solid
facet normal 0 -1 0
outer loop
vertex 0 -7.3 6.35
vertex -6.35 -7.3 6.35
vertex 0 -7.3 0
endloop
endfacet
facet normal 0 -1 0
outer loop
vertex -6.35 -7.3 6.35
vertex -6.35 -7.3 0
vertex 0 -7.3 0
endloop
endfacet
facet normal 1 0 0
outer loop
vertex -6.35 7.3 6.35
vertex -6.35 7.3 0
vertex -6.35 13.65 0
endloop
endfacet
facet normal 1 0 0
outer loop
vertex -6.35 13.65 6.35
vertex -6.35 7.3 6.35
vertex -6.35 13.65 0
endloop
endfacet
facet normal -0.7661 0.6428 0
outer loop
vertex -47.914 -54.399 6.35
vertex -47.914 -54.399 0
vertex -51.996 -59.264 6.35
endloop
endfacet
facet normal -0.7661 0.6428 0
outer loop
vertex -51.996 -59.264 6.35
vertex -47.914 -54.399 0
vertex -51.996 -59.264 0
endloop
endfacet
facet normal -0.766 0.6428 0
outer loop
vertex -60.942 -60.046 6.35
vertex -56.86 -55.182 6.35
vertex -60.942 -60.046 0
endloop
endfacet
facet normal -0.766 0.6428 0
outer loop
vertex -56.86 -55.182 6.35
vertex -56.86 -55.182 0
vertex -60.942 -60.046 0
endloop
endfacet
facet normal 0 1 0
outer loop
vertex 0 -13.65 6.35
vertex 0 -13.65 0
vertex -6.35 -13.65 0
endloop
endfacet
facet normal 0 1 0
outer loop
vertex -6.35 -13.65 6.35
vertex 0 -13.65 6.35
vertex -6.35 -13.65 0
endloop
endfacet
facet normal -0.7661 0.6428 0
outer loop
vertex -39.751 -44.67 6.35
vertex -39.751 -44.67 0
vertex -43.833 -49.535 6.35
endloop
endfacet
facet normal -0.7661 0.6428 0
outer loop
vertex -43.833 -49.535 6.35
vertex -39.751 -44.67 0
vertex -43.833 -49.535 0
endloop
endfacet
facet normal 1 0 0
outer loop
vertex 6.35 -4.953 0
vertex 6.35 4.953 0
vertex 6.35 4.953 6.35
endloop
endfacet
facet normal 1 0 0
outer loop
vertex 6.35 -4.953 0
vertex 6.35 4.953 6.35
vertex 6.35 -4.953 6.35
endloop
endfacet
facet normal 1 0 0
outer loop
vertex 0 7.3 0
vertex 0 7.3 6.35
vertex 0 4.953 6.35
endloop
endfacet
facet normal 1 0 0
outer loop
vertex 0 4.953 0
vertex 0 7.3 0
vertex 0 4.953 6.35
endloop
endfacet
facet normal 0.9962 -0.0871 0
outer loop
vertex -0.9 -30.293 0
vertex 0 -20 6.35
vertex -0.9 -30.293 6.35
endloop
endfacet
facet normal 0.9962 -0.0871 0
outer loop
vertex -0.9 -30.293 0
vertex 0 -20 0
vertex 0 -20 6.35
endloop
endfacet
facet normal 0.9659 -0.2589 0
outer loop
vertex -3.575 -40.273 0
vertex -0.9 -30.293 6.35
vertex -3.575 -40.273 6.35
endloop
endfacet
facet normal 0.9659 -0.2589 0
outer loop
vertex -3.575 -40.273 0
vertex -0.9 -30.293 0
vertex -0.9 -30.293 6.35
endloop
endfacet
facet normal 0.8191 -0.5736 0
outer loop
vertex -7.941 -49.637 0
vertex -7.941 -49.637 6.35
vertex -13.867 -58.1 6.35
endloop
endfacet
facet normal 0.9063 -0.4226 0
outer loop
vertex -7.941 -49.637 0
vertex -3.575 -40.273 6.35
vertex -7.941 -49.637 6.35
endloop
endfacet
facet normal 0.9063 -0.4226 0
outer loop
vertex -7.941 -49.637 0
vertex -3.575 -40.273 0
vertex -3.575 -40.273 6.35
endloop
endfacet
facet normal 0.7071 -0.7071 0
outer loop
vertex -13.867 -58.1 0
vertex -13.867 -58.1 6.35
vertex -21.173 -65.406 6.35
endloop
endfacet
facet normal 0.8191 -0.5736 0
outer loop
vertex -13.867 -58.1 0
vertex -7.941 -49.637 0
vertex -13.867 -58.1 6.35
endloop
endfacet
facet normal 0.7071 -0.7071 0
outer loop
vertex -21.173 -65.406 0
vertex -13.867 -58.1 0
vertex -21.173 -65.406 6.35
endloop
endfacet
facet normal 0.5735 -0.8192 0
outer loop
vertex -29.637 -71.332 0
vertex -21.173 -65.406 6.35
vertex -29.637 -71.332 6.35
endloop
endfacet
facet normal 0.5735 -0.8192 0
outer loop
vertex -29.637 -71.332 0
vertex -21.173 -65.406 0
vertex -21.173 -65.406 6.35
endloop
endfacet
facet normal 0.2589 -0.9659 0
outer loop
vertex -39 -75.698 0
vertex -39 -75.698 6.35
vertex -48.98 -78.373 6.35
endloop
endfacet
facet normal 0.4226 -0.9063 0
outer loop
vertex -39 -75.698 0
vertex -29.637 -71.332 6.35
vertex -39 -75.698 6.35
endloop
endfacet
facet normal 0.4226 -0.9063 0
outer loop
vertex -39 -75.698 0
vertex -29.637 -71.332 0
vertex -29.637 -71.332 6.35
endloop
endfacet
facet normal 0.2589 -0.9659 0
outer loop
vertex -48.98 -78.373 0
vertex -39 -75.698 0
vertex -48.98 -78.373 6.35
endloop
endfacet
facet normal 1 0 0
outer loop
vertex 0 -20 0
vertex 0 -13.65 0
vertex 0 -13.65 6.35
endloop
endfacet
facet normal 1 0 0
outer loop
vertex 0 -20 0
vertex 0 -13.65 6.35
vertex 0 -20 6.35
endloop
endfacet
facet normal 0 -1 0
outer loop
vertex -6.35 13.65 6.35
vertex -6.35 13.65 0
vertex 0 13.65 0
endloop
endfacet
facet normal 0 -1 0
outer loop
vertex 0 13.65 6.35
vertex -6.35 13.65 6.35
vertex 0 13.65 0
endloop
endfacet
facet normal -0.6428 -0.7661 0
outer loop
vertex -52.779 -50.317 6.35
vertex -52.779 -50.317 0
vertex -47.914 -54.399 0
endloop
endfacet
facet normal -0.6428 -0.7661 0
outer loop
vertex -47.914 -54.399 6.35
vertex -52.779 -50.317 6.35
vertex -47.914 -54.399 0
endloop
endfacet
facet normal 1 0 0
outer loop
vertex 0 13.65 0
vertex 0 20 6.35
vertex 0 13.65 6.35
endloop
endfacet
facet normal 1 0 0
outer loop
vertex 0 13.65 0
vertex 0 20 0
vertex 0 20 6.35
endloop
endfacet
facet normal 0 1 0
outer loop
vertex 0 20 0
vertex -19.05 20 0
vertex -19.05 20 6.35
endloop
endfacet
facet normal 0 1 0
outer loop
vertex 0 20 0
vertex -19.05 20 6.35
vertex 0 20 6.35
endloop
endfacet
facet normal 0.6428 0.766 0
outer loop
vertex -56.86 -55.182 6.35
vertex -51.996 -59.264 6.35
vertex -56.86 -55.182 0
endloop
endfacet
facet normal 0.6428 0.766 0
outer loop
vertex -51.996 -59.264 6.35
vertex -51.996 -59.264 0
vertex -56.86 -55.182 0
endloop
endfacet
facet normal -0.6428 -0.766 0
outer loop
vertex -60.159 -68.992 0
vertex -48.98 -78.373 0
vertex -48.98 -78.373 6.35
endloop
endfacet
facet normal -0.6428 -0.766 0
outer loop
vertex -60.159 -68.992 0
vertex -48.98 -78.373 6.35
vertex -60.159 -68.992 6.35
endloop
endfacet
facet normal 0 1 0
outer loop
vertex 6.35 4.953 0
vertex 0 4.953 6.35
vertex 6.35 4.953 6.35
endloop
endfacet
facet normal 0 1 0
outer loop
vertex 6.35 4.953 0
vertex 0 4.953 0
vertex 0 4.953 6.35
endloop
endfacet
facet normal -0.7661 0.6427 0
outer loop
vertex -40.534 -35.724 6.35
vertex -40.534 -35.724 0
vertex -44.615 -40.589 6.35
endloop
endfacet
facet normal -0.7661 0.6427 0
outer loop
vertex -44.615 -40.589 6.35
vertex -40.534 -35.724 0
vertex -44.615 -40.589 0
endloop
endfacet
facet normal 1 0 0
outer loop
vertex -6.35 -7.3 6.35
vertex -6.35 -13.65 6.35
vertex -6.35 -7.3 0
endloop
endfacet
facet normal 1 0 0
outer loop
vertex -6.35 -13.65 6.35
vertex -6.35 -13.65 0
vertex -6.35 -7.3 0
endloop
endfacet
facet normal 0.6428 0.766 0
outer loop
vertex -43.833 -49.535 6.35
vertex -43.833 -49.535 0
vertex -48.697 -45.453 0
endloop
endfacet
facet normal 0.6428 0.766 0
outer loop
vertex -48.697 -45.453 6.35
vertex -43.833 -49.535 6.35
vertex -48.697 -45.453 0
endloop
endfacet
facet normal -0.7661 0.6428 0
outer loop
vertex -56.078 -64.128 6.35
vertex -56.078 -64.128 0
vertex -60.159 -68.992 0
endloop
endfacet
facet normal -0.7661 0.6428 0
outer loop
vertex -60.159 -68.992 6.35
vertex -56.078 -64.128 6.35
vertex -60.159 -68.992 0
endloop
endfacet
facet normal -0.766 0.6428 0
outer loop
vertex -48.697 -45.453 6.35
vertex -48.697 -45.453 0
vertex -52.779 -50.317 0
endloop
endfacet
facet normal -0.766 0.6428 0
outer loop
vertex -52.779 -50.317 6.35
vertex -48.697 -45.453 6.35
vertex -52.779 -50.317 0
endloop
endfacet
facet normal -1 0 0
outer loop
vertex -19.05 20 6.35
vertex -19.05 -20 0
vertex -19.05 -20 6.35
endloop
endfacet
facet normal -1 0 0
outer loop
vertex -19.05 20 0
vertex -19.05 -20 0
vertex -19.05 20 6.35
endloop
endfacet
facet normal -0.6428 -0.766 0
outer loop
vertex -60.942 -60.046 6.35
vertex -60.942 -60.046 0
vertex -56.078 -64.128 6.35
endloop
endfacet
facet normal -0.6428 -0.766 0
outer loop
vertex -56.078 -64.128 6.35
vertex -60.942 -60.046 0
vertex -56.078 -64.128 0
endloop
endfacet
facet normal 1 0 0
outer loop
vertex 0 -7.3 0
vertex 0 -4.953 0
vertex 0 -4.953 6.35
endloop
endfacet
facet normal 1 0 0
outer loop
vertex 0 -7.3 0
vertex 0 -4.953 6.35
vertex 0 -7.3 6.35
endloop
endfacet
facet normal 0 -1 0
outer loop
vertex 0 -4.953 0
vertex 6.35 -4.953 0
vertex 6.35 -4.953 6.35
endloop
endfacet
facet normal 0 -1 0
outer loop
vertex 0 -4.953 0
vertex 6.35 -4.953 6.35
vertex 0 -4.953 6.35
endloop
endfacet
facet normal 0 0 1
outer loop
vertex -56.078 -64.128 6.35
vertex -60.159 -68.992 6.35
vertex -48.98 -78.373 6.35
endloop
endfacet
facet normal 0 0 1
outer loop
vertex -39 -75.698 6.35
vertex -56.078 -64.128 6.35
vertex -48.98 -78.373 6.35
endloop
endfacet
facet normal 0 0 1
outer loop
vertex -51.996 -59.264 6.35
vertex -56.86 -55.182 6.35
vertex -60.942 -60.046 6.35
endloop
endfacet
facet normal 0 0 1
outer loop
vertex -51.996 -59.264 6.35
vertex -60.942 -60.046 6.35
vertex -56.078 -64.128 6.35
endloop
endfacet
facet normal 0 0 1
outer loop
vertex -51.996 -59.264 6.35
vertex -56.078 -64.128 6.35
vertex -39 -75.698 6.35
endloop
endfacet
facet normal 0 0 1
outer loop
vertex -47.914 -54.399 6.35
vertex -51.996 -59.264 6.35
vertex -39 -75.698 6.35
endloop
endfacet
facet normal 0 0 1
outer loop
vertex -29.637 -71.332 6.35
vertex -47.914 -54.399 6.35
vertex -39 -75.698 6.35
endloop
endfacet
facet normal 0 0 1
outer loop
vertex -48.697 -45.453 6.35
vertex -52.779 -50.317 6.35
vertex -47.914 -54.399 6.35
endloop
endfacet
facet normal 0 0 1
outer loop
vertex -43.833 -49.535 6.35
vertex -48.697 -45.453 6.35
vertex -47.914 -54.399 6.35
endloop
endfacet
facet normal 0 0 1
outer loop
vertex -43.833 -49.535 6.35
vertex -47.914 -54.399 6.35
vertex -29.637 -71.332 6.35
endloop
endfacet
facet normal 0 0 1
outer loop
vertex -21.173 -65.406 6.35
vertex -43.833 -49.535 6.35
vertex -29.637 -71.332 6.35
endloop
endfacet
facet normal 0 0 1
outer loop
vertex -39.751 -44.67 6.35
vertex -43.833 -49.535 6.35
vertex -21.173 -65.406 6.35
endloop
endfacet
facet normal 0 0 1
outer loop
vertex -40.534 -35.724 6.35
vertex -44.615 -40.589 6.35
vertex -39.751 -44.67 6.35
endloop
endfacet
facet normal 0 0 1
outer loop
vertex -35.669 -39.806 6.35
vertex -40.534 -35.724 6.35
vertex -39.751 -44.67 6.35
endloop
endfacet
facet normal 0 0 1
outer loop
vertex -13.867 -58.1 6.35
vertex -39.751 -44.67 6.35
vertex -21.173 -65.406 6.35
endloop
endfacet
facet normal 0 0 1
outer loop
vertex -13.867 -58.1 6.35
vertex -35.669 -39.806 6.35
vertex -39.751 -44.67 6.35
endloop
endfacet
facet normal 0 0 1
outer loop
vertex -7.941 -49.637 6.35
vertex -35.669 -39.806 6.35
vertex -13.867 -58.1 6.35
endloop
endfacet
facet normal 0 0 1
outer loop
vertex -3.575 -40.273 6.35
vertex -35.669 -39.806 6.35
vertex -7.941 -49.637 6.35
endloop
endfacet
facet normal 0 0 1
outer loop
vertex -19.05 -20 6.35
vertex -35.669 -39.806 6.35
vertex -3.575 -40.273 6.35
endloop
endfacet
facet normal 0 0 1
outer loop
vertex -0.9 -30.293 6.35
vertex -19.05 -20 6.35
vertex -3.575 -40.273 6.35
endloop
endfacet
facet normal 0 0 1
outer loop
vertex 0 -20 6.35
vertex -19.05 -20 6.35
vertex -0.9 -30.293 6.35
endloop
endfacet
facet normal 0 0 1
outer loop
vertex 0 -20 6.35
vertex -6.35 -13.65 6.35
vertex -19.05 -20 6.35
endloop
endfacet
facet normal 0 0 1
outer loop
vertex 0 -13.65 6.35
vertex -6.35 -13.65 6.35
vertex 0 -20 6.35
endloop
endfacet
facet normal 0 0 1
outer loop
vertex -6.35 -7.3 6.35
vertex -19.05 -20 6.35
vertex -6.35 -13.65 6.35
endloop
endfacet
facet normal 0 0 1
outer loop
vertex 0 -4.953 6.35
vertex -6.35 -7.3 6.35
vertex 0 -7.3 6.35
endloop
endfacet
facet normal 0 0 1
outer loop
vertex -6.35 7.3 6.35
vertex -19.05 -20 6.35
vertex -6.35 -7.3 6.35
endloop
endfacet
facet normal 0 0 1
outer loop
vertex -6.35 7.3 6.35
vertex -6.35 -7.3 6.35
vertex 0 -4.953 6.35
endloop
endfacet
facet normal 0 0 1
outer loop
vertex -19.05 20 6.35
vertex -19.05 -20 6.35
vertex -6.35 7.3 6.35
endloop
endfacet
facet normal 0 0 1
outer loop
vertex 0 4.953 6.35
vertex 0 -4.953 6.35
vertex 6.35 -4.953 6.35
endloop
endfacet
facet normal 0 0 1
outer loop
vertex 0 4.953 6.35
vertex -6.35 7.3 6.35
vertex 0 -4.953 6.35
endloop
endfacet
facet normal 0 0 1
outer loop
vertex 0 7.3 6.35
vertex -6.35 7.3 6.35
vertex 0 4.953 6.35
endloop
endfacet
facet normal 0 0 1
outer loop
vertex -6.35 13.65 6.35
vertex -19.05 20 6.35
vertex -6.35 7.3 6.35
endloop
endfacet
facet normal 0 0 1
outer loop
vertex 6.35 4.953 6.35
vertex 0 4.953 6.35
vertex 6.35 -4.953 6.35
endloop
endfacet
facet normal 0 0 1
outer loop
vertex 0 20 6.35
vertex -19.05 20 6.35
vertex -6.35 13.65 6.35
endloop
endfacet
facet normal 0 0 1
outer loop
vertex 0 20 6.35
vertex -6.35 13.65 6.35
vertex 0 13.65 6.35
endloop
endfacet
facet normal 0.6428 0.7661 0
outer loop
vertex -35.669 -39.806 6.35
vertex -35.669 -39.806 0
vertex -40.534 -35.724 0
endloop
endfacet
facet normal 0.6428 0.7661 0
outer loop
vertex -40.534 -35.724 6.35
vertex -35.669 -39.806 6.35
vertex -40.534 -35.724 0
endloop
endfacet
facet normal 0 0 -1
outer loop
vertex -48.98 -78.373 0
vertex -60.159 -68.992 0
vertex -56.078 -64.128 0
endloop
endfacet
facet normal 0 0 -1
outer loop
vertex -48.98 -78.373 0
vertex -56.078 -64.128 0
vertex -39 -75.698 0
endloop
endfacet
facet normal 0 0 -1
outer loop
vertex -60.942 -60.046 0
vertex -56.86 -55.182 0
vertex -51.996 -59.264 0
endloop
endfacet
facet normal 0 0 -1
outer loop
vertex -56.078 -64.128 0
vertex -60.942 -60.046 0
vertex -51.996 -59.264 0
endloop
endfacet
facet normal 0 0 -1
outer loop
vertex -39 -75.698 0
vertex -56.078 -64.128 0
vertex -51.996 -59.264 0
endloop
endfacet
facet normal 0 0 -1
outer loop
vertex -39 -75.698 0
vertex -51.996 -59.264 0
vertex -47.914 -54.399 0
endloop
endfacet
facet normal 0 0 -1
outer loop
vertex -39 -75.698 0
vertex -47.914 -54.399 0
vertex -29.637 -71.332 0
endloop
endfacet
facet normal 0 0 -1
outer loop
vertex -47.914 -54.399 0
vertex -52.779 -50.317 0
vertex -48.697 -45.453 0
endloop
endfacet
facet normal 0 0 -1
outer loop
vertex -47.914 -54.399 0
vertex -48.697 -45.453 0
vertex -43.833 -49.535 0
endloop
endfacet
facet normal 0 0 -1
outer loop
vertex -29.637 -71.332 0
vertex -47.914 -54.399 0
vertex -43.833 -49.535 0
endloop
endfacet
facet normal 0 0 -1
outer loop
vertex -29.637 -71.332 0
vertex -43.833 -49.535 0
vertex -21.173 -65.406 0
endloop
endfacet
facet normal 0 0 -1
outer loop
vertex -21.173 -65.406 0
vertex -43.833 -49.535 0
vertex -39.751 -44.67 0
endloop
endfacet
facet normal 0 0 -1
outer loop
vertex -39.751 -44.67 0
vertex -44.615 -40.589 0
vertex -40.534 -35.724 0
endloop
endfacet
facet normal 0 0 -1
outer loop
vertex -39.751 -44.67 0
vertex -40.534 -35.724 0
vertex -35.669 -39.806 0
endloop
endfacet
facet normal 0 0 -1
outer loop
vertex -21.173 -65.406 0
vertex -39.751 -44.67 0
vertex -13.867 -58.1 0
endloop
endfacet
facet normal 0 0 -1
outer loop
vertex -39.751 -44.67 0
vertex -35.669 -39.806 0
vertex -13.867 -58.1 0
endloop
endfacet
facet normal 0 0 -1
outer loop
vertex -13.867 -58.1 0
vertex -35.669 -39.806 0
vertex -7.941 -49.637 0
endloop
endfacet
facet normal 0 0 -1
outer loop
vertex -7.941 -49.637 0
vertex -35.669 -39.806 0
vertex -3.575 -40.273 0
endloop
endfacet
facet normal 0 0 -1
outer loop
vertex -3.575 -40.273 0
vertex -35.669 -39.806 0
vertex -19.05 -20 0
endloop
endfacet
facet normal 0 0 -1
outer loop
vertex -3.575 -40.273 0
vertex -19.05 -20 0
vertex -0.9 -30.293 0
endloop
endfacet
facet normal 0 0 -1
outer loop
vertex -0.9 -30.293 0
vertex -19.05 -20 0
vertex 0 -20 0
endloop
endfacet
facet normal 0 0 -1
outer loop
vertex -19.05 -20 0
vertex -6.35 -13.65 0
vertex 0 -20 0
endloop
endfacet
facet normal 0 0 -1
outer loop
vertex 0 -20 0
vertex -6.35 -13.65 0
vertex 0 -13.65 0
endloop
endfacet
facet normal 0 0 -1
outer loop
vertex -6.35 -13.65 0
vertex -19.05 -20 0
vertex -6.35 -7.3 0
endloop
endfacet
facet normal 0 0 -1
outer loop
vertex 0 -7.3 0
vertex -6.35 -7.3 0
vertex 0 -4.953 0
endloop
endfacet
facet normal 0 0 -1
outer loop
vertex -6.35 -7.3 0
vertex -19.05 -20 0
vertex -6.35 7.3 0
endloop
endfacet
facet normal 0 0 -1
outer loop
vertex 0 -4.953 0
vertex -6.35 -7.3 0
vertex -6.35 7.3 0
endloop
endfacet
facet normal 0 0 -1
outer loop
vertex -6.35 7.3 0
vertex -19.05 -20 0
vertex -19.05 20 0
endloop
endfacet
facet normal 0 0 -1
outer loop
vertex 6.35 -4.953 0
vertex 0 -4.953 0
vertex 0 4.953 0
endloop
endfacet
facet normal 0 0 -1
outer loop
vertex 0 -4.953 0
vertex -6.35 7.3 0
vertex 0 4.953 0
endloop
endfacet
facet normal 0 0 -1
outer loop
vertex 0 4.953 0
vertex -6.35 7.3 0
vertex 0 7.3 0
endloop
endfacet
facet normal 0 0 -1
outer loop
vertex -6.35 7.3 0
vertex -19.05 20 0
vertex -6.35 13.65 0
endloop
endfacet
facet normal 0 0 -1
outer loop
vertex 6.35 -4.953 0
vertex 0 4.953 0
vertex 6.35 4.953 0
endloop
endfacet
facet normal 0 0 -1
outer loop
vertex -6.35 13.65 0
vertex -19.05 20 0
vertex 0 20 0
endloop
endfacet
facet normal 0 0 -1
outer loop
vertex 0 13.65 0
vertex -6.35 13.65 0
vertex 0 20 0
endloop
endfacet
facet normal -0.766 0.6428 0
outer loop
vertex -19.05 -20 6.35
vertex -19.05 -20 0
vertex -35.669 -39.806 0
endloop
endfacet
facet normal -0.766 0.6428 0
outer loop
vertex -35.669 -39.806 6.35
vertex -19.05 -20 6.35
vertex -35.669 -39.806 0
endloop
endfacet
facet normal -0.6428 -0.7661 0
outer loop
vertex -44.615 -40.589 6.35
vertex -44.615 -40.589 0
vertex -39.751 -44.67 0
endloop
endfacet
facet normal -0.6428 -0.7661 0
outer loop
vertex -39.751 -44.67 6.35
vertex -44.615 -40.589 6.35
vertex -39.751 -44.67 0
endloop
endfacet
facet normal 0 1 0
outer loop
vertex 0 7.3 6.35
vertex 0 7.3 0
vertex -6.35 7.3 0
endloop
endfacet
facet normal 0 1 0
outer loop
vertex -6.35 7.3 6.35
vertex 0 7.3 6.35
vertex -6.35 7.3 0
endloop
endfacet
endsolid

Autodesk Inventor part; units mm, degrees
ref_plane "YZ Plane" through (0, 0, 0) normal (1, 0, 0) x (0, 1, 0)
ref_plane "XZ Plane" through (0, 0, 0) normal (0, 1, 0) x (-1, 0, 0)
ref_plane "XY Plane" through (0, 0, 0) normal (0, 0, 1) x (1, 0, 0)
sketch "Sketch1" plane through (0, 0, 0) normal (0, 0, 1) x (1, 0, 0)
  line L0 (-19.05, -20) -> (-60.1594, -68.9923)
  line L1 (-6.35, -7.3) -> (0, -7.3)
  line L2 (0, -7.3) -> (0, -13.65)
  line L3 (0, -13.65) -> (-6.35, -13.65)
  line L4 (-6.35, -13.65) -> (-6.35, -7.3)
  line L5 (6.35, -4.953) -> (0, -4.953)
  line L6 (0, -4.953) -> (0, 4.953)
  line L7 (0, 4.953) -> (6.35, 4.953)
  line L8 (6.35, 4.953) -> (6.35, -4.953)
  line L9 (-6.35, 13.65) -> (0, 13.65)
  line L10 (0, 13.65) -> (0, 7.3)
  line L11 (0, 7.3) -> (-6.35, 7.3)
  line L12 (-6.35, 7.3) -> (-6.35, 13.65)
  line L13 (0, -20) -> (-19.05, -20)
  line L14 (-19.05, -20) -> (-19.05, 20)
  line L15 (-19.05, 20) -> (0, 20)
  line L16 (0, 20) -> (0, -20)
  line L17 (-48.9804, -78.3726) -> (-8.1634, -29.7288)
  line L18 (-8.1634, -29.7288) -> (0, -20)
  line L19 (-48.9804, -78.3726) -> (-60.1594, -68.9923)
  line L20 (-56.0777, -64.1279) -> (-51.996, -59.2635)
  line L21 (-51.996, -59.2635) -> (-56.8604, -55.1818)
  line L22 (-56.8604, -55.1818) -> (-60.9421, -60.0462)
  line L23 (-60.9421, -60.0462) -> (-56.0777, -64.1279)
  line L24 (-47.9143, -54.3991) -> (-43.8326, -49.5348)
  line L25 (-43.8326, -49.5348) -> (-48.697, -45.4531)
  line L26 (-48.697, -45.4531) -> (-52.7787, -50.3174)
  line L27 (-52.7787, -50.3174) -> (-47.9143, -54.3991)
  line L28 (-39.7509, -44.6704) -> (-35.6692, -39.806)
  line L29 (-35.6692, -39.806) -> (-40.5336, -35.7243)
  line L30 (-40.5336, -35.7243) -> (-44.6153, -40.5887)
  line L31 (-44.6153, -40.5887) -> (-39.7509, -44.6704)
  arc A0 (-48.9804, -78.3726) -> (0, -20) centre (-59.2731, -20) ccw
  point P0 (0, 0)
  point P1 (0, 0)
  dimension "d0" = 6.35
  dimension "d2" = 9.906
  dimension "d3" = 40
  dimension "d4" = 6.35
  dimension "d5" = 6.35
  dimension "d6" = 6.35
  dimension "d10" = 50
  dimension "d11" = 19.05
  dimension "d12" = 12.7
  dimension "d15" = 6.35
  dimension "d16" = 6.35
  dimension "d19" = 12.7
  dimension "d24" = 76.2
extrude "Extrusion1" add sketch "Sketch1" along normal blind 6.35 contours L13 L18 L17 L19 L0 | L14 L15 L16 L9 L12 L11 L6 L1 L4 L3 L13 | L0 L31 L30 L29 | A0 L17 L18 | L0 L27 L26 L25 | L6 L7 L8 L5 | L23 L22 L21 L0
properties part number "acrylic kinect bracket - bracket"
